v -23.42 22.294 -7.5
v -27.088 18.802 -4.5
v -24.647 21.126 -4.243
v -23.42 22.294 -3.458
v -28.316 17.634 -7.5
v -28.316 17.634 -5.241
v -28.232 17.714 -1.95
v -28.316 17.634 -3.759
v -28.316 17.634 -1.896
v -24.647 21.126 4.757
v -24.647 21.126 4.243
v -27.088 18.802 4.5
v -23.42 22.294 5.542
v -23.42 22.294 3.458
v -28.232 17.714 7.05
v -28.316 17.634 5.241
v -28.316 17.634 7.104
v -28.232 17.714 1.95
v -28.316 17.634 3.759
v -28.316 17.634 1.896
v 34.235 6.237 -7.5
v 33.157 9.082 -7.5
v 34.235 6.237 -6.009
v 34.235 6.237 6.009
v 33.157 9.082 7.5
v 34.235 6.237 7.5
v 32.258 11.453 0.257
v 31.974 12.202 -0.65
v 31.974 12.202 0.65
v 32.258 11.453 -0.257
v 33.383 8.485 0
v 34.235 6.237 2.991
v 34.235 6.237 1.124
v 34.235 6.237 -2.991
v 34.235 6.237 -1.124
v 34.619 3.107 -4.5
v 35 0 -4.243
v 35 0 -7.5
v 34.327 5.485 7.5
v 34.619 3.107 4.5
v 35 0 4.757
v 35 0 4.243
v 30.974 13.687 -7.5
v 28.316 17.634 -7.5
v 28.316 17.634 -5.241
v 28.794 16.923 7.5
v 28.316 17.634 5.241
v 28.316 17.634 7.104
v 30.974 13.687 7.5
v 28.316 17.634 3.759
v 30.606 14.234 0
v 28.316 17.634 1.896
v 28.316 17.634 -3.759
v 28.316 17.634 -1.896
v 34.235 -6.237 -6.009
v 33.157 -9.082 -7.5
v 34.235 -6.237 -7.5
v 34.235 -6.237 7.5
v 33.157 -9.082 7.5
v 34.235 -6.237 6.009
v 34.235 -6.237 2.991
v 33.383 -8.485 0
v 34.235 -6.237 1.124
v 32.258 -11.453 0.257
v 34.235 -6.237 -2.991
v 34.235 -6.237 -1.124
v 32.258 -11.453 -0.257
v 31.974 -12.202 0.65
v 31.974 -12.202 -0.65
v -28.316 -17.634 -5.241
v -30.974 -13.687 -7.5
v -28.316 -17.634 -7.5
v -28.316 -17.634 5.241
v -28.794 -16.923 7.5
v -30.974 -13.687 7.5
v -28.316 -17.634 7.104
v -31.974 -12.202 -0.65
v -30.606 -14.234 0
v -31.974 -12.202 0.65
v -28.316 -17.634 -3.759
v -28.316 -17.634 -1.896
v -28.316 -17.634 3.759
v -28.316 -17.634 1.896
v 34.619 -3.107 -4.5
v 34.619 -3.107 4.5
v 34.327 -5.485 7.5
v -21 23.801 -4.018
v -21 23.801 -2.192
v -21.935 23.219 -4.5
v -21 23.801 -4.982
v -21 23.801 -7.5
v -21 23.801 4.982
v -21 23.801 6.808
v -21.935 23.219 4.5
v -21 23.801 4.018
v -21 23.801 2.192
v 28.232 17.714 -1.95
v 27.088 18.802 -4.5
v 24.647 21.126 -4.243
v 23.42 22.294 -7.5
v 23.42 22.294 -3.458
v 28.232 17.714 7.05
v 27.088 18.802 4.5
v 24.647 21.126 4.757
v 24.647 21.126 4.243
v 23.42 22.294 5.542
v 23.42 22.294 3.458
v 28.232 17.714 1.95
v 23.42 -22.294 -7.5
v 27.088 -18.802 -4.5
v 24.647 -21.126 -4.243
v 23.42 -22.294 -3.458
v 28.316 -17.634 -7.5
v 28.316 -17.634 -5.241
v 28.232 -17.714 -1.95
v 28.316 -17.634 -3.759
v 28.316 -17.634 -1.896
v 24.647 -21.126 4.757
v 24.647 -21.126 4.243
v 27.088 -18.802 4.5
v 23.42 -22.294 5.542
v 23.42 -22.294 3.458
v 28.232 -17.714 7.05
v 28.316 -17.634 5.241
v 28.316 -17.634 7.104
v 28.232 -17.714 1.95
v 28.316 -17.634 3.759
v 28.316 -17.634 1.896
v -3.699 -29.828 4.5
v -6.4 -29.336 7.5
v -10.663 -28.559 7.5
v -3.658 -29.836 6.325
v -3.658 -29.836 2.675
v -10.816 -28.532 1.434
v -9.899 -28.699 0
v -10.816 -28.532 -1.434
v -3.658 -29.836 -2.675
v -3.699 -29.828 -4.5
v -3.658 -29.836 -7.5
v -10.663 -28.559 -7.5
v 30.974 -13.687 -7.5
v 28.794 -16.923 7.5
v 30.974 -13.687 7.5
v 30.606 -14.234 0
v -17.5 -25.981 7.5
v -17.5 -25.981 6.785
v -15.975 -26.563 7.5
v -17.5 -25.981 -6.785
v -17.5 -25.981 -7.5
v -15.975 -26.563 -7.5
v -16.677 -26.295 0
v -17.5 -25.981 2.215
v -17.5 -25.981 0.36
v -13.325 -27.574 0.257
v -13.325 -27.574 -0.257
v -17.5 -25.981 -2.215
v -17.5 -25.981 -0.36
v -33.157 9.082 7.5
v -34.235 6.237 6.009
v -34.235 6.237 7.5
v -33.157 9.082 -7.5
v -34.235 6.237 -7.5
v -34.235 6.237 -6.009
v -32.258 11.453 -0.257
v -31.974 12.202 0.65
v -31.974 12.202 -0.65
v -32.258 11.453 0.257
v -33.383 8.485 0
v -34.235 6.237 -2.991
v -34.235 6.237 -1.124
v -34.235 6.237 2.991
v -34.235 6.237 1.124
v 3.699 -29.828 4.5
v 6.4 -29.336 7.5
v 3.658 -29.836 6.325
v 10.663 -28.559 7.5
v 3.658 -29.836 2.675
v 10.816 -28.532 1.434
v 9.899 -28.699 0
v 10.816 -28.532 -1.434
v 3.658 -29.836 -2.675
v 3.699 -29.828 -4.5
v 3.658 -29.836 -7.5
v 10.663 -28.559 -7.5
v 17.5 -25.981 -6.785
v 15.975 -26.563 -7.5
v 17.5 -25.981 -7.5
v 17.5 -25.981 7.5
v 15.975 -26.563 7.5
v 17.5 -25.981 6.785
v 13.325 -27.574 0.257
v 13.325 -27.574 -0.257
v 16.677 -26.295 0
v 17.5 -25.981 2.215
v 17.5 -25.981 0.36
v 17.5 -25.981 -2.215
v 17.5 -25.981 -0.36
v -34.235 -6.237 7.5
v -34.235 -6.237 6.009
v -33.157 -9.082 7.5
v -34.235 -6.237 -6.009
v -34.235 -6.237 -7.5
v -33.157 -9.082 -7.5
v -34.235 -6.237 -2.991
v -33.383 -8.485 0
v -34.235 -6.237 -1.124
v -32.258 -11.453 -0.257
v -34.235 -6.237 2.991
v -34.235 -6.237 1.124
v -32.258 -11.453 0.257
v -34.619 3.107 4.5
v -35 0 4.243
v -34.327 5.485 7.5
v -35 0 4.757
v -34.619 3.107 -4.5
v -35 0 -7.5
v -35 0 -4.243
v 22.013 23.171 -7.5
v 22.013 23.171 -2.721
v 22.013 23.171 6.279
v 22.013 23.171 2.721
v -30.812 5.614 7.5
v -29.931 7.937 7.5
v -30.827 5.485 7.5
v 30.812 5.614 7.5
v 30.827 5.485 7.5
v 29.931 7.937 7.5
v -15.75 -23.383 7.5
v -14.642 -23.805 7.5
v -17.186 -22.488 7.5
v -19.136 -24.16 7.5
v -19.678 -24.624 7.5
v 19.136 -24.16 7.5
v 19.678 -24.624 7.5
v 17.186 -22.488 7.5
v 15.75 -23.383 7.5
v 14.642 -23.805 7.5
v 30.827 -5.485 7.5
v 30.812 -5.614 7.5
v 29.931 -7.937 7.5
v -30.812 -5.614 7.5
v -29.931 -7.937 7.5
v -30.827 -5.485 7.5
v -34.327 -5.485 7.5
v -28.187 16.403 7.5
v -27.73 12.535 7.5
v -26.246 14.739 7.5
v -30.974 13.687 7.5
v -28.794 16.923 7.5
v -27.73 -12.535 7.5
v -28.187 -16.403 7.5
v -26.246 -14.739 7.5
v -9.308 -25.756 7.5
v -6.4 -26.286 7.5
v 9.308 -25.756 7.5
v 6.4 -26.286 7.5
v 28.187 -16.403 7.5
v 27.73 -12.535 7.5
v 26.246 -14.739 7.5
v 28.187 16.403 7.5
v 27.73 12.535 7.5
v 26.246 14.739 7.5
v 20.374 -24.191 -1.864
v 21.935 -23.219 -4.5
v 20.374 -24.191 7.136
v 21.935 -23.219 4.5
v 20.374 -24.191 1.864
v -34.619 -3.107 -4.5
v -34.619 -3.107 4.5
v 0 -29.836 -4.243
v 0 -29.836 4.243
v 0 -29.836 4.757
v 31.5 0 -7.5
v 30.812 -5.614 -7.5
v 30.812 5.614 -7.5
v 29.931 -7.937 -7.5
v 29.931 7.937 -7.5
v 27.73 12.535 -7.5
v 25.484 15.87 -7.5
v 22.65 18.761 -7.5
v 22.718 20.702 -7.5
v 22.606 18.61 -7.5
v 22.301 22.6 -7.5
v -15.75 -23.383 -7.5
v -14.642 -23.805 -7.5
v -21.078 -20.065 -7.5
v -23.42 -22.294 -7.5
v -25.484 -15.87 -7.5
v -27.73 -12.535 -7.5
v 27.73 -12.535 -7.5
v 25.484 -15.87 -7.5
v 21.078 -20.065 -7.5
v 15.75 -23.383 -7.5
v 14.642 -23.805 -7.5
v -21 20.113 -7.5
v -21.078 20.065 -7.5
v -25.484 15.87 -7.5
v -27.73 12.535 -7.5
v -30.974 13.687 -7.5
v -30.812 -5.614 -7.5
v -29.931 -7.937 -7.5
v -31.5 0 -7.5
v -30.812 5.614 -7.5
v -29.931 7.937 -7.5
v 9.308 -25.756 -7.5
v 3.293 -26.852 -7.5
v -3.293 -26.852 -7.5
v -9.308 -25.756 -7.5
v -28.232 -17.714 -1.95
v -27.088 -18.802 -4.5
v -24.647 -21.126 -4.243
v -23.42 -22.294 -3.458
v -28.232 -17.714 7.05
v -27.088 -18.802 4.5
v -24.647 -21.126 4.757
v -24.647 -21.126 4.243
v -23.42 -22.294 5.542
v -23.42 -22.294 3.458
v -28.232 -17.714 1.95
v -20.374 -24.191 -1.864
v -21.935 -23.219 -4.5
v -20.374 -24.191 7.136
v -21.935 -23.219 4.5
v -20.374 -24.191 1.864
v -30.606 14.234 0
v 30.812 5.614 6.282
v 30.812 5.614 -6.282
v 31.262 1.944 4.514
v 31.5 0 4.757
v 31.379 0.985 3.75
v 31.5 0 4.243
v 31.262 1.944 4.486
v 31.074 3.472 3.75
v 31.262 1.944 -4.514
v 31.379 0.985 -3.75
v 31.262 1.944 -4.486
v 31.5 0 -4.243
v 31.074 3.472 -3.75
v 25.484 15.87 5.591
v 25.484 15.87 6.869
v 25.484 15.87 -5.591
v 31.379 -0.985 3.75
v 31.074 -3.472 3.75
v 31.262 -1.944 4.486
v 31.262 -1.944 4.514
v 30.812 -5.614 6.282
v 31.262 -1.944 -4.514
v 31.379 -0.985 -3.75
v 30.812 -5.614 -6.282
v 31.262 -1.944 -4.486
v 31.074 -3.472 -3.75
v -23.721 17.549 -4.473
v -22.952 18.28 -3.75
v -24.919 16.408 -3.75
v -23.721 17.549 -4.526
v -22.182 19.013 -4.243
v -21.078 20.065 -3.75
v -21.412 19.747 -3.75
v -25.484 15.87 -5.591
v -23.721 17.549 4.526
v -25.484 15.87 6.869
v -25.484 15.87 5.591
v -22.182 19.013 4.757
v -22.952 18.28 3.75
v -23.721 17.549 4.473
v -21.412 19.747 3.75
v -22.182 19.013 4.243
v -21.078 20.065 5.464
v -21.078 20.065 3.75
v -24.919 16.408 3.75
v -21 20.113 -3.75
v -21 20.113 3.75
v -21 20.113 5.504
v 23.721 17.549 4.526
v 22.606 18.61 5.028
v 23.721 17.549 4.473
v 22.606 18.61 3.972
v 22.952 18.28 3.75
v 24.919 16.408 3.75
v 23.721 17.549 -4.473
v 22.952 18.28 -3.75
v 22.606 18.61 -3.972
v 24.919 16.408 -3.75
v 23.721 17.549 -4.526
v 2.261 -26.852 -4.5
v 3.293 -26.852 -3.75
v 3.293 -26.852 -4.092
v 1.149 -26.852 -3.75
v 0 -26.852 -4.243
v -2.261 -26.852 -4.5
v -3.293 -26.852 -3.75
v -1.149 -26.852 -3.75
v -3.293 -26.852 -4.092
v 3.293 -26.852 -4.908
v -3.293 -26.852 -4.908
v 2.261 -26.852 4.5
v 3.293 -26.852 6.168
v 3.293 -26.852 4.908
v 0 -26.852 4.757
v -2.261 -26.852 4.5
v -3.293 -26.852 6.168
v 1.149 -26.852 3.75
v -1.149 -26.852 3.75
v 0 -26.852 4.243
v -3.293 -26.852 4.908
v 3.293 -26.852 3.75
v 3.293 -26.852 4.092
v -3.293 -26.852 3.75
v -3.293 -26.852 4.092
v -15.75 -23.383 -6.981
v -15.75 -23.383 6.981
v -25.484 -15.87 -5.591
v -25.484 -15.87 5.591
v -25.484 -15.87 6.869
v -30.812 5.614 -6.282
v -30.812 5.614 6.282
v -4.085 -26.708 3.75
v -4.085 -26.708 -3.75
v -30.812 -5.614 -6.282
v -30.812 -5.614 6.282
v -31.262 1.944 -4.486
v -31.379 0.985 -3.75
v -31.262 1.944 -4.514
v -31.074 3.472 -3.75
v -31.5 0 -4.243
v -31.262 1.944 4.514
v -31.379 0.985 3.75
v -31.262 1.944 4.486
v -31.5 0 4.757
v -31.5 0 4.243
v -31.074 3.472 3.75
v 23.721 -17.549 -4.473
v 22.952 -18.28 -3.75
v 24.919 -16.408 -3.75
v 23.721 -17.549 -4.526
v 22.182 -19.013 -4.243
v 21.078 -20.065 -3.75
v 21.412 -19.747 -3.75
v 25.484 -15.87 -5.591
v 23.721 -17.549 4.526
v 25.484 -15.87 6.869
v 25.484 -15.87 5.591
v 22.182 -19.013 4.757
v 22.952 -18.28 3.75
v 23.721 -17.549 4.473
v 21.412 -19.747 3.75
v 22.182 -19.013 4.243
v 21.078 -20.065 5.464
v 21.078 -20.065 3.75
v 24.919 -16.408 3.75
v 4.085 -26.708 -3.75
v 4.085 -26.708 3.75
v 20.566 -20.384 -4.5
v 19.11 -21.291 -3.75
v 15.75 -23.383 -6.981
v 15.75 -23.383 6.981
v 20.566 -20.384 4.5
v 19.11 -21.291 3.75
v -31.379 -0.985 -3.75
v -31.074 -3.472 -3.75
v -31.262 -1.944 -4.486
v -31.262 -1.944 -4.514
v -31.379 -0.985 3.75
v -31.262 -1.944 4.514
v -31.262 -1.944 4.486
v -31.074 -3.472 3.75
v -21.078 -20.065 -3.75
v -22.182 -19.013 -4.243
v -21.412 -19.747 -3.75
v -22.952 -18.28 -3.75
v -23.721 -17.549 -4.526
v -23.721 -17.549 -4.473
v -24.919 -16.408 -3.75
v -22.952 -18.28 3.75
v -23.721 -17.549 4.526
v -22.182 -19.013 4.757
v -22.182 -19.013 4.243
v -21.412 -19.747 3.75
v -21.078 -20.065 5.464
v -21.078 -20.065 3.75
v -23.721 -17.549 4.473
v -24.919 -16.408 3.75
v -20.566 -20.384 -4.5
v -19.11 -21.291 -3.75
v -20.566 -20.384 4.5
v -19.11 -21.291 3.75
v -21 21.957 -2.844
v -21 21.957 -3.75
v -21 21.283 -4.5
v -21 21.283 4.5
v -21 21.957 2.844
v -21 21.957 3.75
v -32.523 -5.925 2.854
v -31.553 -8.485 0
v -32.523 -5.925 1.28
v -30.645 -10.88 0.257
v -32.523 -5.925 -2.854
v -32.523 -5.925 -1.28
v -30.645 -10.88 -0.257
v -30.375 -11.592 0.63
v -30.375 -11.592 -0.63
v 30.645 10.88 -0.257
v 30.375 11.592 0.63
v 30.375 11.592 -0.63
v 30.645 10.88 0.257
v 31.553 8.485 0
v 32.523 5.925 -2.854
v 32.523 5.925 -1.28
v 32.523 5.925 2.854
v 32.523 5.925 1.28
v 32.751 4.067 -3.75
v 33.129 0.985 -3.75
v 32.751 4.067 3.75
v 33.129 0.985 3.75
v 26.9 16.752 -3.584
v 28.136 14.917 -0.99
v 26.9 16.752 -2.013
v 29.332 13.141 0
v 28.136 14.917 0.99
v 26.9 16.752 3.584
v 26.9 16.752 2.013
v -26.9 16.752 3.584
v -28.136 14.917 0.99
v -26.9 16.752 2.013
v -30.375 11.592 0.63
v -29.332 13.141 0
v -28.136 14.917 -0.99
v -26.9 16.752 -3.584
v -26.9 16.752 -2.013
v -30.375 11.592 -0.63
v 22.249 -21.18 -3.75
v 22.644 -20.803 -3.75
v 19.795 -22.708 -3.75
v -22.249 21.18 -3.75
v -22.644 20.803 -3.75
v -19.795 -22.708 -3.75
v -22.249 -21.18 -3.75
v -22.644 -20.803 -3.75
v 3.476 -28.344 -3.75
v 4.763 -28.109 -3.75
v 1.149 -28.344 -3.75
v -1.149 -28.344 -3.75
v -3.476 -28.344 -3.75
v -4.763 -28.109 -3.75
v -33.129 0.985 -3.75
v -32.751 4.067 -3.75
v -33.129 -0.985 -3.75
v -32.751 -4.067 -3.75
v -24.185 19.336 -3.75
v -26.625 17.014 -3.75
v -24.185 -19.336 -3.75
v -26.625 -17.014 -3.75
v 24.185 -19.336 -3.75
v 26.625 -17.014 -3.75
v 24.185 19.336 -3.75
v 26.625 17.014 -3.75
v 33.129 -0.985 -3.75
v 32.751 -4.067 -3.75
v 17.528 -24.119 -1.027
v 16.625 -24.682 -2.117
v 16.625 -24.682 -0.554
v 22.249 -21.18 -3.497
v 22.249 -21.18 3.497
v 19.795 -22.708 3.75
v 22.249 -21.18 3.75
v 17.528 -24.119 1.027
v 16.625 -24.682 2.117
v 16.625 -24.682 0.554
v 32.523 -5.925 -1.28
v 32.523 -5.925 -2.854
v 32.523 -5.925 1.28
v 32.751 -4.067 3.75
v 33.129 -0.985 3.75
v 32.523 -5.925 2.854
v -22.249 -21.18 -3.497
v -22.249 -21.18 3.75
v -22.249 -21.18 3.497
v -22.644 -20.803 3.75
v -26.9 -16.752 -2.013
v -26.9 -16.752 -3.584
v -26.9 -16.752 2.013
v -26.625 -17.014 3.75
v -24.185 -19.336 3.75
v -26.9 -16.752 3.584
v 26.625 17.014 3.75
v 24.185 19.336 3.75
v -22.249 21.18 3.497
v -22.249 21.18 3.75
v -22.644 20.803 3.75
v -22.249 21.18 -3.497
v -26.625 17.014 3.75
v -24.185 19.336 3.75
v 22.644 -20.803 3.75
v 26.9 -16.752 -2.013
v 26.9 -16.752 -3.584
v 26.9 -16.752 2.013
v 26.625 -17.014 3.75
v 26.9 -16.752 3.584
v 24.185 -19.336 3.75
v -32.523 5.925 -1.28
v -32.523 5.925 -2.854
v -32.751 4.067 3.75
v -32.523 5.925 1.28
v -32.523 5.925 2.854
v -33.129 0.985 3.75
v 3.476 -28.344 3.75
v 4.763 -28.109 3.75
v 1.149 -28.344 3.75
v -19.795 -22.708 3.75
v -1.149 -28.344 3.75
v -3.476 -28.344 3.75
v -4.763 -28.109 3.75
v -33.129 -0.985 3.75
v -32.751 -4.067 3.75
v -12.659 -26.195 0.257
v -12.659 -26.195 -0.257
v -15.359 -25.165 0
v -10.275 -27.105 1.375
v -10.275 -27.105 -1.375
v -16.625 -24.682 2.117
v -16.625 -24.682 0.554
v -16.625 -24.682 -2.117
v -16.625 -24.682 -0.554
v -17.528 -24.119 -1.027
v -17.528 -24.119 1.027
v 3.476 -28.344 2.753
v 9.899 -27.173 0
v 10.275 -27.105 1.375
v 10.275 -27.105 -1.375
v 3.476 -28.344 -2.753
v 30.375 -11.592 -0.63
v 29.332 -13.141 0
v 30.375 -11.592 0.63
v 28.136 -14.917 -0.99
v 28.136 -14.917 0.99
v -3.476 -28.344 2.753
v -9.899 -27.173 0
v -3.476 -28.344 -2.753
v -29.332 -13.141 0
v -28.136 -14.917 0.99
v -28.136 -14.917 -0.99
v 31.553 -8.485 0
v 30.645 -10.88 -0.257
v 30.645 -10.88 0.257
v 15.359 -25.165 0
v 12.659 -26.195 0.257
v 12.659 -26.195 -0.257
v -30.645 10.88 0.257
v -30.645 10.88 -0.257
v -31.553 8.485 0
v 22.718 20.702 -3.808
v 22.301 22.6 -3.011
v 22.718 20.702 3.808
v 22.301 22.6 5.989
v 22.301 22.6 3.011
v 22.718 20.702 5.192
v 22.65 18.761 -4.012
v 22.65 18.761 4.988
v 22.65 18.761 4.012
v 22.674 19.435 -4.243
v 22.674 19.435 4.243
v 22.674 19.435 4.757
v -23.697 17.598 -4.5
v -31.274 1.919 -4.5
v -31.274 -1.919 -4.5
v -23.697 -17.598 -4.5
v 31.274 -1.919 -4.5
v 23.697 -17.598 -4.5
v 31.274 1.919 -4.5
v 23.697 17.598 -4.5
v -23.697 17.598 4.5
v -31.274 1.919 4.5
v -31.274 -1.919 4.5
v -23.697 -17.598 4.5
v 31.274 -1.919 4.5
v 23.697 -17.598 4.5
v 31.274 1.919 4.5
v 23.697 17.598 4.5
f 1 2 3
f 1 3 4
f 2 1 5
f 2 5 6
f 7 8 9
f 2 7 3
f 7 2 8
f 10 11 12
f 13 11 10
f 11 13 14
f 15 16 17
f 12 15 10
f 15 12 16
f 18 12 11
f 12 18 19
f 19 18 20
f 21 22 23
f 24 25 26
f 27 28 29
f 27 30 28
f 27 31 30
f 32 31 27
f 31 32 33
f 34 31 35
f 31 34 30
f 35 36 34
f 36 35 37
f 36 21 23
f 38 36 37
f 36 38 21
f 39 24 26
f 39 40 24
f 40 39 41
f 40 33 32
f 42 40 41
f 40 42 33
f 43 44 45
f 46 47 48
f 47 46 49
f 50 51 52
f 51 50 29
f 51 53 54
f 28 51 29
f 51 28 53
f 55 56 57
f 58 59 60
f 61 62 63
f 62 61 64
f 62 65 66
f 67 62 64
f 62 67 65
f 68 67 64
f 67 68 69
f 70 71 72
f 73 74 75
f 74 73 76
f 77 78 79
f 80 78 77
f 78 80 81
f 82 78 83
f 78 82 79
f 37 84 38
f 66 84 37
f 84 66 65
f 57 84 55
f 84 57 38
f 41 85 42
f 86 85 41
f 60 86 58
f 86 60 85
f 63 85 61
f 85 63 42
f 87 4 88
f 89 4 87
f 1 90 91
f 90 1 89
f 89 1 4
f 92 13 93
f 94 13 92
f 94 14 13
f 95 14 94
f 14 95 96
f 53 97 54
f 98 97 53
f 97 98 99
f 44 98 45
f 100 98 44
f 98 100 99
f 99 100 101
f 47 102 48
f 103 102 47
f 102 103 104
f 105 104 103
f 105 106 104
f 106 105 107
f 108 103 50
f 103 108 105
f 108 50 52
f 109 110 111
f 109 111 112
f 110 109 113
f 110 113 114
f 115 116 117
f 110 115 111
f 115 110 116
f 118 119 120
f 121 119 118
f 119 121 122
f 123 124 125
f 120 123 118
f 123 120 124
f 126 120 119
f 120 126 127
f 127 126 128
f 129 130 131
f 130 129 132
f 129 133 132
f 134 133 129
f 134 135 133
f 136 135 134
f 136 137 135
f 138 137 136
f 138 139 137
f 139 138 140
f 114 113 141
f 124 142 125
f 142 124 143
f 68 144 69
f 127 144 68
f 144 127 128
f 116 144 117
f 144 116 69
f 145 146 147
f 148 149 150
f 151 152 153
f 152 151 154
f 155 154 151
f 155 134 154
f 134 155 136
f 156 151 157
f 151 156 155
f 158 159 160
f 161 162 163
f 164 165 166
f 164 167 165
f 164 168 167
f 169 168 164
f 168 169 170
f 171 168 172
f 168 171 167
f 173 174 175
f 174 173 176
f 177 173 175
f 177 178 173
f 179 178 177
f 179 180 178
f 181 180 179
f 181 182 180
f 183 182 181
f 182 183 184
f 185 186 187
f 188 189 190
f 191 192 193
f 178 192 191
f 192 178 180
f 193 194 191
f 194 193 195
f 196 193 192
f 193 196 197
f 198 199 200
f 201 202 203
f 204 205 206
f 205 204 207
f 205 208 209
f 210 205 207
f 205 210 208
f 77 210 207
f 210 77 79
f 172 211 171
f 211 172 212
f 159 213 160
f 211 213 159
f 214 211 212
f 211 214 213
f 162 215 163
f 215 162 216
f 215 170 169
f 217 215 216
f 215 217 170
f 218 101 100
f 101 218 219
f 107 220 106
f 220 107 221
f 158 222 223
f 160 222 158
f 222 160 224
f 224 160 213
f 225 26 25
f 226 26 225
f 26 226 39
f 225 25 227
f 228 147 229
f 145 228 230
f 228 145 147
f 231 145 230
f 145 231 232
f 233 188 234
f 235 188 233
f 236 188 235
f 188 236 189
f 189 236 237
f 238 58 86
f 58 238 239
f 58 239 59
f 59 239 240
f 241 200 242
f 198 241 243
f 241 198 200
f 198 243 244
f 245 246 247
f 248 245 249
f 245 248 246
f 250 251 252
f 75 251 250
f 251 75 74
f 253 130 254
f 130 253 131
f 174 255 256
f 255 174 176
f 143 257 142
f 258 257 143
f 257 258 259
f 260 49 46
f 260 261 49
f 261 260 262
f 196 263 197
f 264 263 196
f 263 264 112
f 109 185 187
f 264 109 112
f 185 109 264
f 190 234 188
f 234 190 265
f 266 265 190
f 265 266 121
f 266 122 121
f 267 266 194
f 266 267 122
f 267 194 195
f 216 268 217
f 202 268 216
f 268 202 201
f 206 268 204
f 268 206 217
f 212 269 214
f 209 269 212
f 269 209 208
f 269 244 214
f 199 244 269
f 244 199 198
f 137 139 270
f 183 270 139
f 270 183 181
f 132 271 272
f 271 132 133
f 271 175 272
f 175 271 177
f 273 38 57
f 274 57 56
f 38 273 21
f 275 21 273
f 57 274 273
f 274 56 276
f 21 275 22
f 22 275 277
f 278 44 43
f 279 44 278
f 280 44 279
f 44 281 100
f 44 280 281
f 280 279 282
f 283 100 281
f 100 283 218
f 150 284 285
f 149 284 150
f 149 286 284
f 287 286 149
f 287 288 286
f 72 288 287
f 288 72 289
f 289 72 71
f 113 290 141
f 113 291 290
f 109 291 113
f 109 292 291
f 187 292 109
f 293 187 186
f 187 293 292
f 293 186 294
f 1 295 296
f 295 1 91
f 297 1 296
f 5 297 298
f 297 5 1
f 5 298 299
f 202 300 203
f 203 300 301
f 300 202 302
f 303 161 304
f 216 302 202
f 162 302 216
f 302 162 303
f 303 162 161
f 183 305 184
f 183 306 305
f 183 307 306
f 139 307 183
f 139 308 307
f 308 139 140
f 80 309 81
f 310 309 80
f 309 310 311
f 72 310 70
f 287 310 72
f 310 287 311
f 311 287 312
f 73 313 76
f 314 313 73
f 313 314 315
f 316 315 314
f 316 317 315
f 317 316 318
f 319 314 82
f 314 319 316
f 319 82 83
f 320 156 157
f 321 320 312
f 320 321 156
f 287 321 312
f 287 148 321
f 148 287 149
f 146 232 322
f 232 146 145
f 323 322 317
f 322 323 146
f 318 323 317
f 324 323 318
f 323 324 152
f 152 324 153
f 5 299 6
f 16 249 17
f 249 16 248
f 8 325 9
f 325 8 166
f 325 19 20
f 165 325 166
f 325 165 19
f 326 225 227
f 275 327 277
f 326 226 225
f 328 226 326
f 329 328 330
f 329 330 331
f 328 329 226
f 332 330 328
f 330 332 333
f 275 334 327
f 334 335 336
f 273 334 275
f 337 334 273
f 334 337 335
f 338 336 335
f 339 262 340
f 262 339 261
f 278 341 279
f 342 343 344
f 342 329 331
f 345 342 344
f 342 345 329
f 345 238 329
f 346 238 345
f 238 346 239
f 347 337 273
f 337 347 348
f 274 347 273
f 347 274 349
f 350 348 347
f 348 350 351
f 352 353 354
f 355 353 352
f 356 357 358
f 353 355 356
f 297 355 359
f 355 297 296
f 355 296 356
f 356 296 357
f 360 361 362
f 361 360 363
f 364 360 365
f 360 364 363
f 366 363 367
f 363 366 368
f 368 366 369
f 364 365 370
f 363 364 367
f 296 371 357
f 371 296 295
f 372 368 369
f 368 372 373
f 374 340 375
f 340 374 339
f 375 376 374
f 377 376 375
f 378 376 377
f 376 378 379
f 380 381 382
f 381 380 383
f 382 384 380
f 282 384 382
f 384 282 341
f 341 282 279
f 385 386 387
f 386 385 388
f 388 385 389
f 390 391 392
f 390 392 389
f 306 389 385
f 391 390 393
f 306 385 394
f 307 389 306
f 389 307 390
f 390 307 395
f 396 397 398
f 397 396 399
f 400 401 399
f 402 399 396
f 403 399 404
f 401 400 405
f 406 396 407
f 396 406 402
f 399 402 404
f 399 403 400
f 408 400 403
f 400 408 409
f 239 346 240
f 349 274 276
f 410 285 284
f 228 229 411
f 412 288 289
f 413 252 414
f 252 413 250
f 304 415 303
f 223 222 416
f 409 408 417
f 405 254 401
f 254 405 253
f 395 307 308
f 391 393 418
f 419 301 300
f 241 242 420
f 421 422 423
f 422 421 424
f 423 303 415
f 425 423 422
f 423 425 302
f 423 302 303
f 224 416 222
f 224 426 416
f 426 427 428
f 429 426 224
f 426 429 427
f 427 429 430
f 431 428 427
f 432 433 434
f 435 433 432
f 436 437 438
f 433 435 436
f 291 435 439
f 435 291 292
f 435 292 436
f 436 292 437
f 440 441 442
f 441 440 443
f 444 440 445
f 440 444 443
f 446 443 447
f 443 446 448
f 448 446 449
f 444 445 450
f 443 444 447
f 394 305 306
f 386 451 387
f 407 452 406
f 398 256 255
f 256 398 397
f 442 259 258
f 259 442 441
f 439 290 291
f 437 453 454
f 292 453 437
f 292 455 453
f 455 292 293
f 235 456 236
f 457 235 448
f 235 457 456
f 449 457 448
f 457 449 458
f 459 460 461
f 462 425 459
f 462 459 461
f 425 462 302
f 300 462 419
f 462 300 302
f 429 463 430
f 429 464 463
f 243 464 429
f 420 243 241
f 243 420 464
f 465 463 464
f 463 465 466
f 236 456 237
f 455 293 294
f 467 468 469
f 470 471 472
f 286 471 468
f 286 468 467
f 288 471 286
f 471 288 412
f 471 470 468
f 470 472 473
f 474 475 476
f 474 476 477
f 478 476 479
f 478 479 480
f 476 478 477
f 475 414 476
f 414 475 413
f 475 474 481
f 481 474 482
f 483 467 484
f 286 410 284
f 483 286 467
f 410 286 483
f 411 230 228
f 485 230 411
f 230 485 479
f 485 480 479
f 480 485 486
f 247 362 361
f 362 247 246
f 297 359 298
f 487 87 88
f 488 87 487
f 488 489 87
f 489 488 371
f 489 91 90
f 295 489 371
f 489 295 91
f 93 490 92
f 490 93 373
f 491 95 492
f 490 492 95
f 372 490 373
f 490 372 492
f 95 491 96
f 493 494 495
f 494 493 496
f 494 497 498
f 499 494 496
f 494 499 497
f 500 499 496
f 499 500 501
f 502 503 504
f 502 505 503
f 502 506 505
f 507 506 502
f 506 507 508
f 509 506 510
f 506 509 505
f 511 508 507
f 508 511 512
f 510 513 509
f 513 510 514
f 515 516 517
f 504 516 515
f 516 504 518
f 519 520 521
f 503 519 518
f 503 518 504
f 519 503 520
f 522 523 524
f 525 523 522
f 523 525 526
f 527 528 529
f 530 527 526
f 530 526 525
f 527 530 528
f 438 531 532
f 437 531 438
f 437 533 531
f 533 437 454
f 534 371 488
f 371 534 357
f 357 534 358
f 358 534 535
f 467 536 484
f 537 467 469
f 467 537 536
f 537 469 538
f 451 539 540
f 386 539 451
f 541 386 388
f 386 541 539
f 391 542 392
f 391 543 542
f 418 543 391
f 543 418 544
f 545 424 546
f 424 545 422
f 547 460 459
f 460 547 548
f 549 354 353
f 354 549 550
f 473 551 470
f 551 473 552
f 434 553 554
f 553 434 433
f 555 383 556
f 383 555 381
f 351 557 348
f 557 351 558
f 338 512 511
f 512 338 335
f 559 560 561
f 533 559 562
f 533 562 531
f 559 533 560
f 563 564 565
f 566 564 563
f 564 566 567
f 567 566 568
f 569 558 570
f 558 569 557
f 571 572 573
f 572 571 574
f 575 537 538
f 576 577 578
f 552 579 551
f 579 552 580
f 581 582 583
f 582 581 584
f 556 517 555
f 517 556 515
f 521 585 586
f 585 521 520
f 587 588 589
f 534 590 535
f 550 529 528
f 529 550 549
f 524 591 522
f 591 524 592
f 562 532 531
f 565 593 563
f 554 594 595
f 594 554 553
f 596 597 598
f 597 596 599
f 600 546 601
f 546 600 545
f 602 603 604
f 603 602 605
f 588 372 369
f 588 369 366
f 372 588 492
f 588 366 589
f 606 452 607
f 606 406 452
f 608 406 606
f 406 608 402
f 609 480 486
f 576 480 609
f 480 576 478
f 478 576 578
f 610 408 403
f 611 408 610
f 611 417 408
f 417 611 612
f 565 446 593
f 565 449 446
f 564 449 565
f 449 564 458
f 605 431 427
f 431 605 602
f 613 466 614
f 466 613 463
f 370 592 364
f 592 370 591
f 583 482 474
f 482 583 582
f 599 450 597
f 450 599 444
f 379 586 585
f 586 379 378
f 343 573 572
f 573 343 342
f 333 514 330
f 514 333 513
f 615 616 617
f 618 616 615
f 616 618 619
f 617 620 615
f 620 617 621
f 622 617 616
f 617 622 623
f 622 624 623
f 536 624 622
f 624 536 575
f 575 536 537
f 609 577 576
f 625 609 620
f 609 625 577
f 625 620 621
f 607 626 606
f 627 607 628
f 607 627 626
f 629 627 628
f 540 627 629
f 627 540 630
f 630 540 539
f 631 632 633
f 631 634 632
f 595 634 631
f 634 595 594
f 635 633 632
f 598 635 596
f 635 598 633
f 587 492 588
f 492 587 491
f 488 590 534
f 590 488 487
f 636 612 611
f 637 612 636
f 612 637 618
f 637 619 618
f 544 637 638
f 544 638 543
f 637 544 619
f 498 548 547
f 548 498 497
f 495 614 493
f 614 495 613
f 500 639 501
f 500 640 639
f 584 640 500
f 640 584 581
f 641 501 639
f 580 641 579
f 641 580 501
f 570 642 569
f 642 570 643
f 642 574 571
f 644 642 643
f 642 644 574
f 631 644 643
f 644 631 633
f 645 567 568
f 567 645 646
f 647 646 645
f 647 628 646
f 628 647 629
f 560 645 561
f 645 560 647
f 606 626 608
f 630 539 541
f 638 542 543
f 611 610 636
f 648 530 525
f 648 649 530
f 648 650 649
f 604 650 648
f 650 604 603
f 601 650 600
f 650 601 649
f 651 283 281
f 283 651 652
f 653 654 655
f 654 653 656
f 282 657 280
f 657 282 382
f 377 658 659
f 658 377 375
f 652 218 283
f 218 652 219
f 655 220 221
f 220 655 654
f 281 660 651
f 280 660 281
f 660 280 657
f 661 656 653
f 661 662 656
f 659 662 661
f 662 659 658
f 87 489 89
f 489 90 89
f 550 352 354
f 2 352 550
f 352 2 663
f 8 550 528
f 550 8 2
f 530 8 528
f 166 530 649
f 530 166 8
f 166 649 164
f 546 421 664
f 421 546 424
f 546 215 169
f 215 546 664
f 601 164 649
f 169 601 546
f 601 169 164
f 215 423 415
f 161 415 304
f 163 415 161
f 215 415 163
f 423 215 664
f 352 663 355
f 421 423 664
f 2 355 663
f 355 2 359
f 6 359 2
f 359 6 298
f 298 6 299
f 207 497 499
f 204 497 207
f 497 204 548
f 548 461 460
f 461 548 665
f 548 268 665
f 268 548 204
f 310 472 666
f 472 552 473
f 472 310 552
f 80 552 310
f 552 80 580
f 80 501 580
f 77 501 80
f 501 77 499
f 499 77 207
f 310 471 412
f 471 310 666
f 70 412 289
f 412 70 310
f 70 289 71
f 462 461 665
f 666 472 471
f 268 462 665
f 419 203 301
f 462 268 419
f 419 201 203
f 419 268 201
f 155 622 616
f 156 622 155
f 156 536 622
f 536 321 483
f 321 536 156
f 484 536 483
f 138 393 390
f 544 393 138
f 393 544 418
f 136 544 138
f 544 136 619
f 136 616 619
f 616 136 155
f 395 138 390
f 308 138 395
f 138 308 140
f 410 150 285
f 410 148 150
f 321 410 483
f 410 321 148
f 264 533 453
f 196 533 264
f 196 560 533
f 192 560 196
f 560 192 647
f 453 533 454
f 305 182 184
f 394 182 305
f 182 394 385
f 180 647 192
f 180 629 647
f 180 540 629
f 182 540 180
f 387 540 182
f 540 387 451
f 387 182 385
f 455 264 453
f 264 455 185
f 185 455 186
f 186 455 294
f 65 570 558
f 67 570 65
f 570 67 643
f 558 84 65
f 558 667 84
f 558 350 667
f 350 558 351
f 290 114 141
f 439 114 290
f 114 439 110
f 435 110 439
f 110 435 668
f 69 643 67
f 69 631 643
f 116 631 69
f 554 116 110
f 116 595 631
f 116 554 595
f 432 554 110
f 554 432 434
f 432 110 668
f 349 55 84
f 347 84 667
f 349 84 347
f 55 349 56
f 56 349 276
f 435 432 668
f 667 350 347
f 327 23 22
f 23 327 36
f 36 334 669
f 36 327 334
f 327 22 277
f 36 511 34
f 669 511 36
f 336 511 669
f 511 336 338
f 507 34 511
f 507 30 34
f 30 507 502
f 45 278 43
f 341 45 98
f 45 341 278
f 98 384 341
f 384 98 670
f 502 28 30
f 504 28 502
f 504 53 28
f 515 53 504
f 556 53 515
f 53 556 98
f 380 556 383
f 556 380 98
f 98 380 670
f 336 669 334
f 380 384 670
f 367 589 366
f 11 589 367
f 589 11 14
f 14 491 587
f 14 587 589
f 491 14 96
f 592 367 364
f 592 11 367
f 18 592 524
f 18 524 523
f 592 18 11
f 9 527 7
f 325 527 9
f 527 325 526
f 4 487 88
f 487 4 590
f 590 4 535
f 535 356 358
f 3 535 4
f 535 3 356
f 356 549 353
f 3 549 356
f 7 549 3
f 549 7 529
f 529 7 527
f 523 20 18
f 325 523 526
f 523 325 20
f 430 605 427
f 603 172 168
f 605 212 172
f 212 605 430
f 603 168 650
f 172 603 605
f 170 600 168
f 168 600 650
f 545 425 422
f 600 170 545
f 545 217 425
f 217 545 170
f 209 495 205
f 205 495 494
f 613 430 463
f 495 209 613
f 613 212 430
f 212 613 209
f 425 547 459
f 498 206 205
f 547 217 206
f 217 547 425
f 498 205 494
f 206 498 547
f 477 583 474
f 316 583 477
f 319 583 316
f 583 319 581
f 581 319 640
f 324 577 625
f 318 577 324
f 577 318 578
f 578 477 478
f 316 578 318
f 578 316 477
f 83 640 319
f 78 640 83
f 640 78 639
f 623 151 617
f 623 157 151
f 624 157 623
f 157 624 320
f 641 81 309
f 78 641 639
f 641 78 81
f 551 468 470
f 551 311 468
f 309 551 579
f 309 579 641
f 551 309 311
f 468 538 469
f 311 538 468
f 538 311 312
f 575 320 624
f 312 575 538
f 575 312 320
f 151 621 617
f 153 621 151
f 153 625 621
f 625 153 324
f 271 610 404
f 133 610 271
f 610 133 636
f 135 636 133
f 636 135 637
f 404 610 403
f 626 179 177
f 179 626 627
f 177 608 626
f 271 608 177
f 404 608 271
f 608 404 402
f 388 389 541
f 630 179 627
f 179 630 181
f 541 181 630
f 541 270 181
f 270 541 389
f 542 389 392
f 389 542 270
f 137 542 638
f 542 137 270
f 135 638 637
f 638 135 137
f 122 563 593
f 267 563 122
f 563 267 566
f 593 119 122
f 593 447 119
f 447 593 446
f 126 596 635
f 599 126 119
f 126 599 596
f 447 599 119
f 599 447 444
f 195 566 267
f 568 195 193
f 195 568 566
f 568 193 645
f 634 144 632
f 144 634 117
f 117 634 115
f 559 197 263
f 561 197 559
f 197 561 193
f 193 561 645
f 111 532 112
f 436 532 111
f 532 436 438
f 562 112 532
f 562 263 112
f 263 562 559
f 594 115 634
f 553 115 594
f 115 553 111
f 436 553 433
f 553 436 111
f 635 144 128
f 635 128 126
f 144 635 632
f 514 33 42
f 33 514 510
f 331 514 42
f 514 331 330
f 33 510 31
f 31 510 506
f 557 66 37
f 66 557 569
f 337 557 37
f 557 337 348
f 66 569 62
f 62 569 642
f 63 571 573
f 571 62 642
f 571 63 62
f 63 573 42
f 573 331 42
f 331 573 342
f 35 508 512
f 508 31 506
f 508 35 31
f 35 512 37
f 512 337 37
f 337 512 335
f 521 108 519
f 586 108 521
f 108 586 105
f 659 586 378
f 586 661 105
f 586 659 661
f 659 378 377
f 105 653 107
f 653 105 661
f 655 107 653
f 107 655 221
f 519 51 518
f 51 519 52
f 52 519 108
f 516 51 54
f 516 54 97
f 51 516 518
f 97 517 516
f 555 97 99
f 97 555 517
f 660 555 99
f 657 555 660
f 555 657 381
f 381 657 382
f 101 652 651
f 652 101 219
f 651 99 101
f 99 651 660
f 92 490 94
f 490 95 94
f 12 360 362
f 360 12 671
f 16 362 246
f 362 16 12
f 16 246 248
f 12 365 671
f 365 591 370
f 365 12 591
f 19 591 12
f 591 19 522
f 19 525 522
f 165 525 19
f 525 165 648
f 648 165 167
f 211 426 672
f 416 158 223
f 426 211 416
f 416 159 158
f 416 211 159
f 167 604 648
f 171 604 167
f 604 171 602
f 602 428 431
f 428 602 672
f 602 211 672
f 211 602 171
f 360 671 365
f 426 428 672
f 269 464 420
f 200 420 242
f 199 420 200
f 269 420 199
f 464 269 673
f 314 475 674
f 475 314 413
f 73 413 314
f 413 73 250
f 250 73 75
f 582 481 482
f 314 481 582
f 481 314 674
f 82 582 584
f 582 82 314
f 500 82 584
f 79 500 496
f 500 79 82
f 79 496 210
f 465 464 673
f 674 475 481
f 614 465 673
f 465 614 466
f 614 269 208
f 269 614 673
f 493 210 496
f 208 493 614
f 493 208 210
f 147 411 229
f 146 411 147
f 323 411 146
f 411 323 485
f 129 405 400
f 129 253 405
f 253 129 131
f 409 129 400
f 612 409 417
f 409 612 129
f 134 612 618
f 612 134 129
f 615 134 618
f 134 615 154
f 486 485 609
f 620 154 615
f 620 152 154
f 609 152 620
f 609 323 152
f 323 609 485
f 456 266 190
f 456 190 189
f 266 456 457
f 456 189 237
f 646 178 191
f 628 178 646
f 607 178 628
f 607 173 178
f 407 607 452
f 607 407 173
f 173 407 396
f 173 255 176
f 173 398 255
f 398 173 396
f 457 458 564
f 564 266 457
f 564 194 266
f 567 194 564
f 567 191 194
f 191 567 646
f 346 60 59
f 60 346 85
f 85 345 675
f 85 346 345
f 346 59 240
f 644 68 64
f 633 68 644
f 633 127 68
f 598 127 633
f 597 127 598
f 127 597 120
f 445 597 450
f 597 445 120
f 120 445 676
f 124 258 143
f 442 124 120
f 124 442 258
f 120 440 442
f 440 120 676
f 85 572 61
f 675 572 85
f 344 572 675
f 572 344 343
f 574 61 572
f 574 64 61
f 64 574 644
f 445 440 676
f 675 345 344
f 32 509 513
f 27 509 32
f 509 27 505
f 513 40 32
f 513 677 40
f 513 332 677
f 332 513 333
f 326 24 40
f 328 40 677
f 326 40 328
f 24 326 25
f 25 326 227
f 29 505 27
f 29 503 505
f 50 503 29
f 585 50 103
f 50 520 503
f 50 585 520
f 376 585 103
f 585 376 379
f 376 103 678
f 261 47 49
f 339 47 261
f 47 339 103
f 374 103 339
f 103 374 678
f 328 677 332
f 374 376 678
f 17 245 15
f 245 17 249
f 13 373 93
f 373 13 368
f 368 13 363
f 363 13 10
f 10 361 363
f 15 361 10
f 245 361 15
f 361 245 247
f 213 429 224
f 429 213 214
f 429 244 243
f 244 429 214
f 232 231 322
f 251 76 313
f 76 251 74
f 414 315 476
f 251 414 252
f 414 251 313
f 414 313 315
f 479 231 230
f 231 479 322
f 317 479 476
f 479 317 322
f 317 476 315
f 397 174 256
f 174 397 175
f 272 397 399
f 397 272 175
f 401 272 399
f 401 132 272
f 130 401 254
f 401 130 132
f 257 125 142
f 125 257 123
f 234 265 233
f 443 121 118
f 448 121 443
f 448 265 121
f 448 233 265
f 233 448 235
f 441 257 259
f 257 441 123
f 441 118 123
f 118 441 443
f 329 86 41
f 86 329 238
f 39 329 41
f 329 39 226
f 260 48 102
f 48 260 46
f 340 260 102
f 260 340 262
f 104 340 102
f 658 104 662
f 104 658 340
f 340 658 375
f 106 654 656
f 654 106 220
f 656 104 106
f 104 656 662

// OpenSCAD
// file: simple.scad
include <../config.scad> 

/**/
scale([width/2/quality,height/2/quality,depth/quality]){
    
    difference(){

        cylinder(h = 1*quality, r1 = 1*quality, r2 = 1*quality, center=true){}

        cylinder(h = 1*quality, r1 = (1-thinkness)*quality, r2 = 0.9*quality, center=true){}

        translate([0,(1-(thinkness/2))*quality,0]){
            cube([join*quality,thinkness*quality*10,1*quality],true){}
        }
        
        cylinder(h = 0.5*quality, r1 = (1-(thinkness/2))*quality, r2 = (1-(thinkness/2))*quality, center=true){}
    }
    
    
       

}

translate([15,20,0]){
    rotate([0,0,-110]){
        difference(){
            
            cylinder(h = depth, r1 = 11.5/2+2, r2 = 11.5/2+2, center=true){}
            
            translate([0,0,2]){
                cylinder(h = depth, r1 = 11.5/2, r2 = 11.5/2, center=true){}
            }
            
            translate([0,6,0]){
                cube([2,5,depth-4],true){}
            }
            
        }
    }
}





/**/
// file: ../config.scad
width = 70;
height = 60;
depth=15;

thinkness=.1;
join=1.2;

quality=1000;
// main file
include <../config.scad> 

/*
TODO: Add params
*/
/**/

difference(){
    
    include <./simple.scad> 

    scale([width/2,height/2,depth]){

        for (level = [-1:1:2]) {
            for (rotation = [0:45:360]) {
                rotate([0,0,rotation+level*22.5]){
                    translate([0,1,level*.3]){
                        rotate([0,45,0]){
                            cube([.4,.3,.4],true){}
                        }
                    }
                }
            }
        }


    }

}
/**/
